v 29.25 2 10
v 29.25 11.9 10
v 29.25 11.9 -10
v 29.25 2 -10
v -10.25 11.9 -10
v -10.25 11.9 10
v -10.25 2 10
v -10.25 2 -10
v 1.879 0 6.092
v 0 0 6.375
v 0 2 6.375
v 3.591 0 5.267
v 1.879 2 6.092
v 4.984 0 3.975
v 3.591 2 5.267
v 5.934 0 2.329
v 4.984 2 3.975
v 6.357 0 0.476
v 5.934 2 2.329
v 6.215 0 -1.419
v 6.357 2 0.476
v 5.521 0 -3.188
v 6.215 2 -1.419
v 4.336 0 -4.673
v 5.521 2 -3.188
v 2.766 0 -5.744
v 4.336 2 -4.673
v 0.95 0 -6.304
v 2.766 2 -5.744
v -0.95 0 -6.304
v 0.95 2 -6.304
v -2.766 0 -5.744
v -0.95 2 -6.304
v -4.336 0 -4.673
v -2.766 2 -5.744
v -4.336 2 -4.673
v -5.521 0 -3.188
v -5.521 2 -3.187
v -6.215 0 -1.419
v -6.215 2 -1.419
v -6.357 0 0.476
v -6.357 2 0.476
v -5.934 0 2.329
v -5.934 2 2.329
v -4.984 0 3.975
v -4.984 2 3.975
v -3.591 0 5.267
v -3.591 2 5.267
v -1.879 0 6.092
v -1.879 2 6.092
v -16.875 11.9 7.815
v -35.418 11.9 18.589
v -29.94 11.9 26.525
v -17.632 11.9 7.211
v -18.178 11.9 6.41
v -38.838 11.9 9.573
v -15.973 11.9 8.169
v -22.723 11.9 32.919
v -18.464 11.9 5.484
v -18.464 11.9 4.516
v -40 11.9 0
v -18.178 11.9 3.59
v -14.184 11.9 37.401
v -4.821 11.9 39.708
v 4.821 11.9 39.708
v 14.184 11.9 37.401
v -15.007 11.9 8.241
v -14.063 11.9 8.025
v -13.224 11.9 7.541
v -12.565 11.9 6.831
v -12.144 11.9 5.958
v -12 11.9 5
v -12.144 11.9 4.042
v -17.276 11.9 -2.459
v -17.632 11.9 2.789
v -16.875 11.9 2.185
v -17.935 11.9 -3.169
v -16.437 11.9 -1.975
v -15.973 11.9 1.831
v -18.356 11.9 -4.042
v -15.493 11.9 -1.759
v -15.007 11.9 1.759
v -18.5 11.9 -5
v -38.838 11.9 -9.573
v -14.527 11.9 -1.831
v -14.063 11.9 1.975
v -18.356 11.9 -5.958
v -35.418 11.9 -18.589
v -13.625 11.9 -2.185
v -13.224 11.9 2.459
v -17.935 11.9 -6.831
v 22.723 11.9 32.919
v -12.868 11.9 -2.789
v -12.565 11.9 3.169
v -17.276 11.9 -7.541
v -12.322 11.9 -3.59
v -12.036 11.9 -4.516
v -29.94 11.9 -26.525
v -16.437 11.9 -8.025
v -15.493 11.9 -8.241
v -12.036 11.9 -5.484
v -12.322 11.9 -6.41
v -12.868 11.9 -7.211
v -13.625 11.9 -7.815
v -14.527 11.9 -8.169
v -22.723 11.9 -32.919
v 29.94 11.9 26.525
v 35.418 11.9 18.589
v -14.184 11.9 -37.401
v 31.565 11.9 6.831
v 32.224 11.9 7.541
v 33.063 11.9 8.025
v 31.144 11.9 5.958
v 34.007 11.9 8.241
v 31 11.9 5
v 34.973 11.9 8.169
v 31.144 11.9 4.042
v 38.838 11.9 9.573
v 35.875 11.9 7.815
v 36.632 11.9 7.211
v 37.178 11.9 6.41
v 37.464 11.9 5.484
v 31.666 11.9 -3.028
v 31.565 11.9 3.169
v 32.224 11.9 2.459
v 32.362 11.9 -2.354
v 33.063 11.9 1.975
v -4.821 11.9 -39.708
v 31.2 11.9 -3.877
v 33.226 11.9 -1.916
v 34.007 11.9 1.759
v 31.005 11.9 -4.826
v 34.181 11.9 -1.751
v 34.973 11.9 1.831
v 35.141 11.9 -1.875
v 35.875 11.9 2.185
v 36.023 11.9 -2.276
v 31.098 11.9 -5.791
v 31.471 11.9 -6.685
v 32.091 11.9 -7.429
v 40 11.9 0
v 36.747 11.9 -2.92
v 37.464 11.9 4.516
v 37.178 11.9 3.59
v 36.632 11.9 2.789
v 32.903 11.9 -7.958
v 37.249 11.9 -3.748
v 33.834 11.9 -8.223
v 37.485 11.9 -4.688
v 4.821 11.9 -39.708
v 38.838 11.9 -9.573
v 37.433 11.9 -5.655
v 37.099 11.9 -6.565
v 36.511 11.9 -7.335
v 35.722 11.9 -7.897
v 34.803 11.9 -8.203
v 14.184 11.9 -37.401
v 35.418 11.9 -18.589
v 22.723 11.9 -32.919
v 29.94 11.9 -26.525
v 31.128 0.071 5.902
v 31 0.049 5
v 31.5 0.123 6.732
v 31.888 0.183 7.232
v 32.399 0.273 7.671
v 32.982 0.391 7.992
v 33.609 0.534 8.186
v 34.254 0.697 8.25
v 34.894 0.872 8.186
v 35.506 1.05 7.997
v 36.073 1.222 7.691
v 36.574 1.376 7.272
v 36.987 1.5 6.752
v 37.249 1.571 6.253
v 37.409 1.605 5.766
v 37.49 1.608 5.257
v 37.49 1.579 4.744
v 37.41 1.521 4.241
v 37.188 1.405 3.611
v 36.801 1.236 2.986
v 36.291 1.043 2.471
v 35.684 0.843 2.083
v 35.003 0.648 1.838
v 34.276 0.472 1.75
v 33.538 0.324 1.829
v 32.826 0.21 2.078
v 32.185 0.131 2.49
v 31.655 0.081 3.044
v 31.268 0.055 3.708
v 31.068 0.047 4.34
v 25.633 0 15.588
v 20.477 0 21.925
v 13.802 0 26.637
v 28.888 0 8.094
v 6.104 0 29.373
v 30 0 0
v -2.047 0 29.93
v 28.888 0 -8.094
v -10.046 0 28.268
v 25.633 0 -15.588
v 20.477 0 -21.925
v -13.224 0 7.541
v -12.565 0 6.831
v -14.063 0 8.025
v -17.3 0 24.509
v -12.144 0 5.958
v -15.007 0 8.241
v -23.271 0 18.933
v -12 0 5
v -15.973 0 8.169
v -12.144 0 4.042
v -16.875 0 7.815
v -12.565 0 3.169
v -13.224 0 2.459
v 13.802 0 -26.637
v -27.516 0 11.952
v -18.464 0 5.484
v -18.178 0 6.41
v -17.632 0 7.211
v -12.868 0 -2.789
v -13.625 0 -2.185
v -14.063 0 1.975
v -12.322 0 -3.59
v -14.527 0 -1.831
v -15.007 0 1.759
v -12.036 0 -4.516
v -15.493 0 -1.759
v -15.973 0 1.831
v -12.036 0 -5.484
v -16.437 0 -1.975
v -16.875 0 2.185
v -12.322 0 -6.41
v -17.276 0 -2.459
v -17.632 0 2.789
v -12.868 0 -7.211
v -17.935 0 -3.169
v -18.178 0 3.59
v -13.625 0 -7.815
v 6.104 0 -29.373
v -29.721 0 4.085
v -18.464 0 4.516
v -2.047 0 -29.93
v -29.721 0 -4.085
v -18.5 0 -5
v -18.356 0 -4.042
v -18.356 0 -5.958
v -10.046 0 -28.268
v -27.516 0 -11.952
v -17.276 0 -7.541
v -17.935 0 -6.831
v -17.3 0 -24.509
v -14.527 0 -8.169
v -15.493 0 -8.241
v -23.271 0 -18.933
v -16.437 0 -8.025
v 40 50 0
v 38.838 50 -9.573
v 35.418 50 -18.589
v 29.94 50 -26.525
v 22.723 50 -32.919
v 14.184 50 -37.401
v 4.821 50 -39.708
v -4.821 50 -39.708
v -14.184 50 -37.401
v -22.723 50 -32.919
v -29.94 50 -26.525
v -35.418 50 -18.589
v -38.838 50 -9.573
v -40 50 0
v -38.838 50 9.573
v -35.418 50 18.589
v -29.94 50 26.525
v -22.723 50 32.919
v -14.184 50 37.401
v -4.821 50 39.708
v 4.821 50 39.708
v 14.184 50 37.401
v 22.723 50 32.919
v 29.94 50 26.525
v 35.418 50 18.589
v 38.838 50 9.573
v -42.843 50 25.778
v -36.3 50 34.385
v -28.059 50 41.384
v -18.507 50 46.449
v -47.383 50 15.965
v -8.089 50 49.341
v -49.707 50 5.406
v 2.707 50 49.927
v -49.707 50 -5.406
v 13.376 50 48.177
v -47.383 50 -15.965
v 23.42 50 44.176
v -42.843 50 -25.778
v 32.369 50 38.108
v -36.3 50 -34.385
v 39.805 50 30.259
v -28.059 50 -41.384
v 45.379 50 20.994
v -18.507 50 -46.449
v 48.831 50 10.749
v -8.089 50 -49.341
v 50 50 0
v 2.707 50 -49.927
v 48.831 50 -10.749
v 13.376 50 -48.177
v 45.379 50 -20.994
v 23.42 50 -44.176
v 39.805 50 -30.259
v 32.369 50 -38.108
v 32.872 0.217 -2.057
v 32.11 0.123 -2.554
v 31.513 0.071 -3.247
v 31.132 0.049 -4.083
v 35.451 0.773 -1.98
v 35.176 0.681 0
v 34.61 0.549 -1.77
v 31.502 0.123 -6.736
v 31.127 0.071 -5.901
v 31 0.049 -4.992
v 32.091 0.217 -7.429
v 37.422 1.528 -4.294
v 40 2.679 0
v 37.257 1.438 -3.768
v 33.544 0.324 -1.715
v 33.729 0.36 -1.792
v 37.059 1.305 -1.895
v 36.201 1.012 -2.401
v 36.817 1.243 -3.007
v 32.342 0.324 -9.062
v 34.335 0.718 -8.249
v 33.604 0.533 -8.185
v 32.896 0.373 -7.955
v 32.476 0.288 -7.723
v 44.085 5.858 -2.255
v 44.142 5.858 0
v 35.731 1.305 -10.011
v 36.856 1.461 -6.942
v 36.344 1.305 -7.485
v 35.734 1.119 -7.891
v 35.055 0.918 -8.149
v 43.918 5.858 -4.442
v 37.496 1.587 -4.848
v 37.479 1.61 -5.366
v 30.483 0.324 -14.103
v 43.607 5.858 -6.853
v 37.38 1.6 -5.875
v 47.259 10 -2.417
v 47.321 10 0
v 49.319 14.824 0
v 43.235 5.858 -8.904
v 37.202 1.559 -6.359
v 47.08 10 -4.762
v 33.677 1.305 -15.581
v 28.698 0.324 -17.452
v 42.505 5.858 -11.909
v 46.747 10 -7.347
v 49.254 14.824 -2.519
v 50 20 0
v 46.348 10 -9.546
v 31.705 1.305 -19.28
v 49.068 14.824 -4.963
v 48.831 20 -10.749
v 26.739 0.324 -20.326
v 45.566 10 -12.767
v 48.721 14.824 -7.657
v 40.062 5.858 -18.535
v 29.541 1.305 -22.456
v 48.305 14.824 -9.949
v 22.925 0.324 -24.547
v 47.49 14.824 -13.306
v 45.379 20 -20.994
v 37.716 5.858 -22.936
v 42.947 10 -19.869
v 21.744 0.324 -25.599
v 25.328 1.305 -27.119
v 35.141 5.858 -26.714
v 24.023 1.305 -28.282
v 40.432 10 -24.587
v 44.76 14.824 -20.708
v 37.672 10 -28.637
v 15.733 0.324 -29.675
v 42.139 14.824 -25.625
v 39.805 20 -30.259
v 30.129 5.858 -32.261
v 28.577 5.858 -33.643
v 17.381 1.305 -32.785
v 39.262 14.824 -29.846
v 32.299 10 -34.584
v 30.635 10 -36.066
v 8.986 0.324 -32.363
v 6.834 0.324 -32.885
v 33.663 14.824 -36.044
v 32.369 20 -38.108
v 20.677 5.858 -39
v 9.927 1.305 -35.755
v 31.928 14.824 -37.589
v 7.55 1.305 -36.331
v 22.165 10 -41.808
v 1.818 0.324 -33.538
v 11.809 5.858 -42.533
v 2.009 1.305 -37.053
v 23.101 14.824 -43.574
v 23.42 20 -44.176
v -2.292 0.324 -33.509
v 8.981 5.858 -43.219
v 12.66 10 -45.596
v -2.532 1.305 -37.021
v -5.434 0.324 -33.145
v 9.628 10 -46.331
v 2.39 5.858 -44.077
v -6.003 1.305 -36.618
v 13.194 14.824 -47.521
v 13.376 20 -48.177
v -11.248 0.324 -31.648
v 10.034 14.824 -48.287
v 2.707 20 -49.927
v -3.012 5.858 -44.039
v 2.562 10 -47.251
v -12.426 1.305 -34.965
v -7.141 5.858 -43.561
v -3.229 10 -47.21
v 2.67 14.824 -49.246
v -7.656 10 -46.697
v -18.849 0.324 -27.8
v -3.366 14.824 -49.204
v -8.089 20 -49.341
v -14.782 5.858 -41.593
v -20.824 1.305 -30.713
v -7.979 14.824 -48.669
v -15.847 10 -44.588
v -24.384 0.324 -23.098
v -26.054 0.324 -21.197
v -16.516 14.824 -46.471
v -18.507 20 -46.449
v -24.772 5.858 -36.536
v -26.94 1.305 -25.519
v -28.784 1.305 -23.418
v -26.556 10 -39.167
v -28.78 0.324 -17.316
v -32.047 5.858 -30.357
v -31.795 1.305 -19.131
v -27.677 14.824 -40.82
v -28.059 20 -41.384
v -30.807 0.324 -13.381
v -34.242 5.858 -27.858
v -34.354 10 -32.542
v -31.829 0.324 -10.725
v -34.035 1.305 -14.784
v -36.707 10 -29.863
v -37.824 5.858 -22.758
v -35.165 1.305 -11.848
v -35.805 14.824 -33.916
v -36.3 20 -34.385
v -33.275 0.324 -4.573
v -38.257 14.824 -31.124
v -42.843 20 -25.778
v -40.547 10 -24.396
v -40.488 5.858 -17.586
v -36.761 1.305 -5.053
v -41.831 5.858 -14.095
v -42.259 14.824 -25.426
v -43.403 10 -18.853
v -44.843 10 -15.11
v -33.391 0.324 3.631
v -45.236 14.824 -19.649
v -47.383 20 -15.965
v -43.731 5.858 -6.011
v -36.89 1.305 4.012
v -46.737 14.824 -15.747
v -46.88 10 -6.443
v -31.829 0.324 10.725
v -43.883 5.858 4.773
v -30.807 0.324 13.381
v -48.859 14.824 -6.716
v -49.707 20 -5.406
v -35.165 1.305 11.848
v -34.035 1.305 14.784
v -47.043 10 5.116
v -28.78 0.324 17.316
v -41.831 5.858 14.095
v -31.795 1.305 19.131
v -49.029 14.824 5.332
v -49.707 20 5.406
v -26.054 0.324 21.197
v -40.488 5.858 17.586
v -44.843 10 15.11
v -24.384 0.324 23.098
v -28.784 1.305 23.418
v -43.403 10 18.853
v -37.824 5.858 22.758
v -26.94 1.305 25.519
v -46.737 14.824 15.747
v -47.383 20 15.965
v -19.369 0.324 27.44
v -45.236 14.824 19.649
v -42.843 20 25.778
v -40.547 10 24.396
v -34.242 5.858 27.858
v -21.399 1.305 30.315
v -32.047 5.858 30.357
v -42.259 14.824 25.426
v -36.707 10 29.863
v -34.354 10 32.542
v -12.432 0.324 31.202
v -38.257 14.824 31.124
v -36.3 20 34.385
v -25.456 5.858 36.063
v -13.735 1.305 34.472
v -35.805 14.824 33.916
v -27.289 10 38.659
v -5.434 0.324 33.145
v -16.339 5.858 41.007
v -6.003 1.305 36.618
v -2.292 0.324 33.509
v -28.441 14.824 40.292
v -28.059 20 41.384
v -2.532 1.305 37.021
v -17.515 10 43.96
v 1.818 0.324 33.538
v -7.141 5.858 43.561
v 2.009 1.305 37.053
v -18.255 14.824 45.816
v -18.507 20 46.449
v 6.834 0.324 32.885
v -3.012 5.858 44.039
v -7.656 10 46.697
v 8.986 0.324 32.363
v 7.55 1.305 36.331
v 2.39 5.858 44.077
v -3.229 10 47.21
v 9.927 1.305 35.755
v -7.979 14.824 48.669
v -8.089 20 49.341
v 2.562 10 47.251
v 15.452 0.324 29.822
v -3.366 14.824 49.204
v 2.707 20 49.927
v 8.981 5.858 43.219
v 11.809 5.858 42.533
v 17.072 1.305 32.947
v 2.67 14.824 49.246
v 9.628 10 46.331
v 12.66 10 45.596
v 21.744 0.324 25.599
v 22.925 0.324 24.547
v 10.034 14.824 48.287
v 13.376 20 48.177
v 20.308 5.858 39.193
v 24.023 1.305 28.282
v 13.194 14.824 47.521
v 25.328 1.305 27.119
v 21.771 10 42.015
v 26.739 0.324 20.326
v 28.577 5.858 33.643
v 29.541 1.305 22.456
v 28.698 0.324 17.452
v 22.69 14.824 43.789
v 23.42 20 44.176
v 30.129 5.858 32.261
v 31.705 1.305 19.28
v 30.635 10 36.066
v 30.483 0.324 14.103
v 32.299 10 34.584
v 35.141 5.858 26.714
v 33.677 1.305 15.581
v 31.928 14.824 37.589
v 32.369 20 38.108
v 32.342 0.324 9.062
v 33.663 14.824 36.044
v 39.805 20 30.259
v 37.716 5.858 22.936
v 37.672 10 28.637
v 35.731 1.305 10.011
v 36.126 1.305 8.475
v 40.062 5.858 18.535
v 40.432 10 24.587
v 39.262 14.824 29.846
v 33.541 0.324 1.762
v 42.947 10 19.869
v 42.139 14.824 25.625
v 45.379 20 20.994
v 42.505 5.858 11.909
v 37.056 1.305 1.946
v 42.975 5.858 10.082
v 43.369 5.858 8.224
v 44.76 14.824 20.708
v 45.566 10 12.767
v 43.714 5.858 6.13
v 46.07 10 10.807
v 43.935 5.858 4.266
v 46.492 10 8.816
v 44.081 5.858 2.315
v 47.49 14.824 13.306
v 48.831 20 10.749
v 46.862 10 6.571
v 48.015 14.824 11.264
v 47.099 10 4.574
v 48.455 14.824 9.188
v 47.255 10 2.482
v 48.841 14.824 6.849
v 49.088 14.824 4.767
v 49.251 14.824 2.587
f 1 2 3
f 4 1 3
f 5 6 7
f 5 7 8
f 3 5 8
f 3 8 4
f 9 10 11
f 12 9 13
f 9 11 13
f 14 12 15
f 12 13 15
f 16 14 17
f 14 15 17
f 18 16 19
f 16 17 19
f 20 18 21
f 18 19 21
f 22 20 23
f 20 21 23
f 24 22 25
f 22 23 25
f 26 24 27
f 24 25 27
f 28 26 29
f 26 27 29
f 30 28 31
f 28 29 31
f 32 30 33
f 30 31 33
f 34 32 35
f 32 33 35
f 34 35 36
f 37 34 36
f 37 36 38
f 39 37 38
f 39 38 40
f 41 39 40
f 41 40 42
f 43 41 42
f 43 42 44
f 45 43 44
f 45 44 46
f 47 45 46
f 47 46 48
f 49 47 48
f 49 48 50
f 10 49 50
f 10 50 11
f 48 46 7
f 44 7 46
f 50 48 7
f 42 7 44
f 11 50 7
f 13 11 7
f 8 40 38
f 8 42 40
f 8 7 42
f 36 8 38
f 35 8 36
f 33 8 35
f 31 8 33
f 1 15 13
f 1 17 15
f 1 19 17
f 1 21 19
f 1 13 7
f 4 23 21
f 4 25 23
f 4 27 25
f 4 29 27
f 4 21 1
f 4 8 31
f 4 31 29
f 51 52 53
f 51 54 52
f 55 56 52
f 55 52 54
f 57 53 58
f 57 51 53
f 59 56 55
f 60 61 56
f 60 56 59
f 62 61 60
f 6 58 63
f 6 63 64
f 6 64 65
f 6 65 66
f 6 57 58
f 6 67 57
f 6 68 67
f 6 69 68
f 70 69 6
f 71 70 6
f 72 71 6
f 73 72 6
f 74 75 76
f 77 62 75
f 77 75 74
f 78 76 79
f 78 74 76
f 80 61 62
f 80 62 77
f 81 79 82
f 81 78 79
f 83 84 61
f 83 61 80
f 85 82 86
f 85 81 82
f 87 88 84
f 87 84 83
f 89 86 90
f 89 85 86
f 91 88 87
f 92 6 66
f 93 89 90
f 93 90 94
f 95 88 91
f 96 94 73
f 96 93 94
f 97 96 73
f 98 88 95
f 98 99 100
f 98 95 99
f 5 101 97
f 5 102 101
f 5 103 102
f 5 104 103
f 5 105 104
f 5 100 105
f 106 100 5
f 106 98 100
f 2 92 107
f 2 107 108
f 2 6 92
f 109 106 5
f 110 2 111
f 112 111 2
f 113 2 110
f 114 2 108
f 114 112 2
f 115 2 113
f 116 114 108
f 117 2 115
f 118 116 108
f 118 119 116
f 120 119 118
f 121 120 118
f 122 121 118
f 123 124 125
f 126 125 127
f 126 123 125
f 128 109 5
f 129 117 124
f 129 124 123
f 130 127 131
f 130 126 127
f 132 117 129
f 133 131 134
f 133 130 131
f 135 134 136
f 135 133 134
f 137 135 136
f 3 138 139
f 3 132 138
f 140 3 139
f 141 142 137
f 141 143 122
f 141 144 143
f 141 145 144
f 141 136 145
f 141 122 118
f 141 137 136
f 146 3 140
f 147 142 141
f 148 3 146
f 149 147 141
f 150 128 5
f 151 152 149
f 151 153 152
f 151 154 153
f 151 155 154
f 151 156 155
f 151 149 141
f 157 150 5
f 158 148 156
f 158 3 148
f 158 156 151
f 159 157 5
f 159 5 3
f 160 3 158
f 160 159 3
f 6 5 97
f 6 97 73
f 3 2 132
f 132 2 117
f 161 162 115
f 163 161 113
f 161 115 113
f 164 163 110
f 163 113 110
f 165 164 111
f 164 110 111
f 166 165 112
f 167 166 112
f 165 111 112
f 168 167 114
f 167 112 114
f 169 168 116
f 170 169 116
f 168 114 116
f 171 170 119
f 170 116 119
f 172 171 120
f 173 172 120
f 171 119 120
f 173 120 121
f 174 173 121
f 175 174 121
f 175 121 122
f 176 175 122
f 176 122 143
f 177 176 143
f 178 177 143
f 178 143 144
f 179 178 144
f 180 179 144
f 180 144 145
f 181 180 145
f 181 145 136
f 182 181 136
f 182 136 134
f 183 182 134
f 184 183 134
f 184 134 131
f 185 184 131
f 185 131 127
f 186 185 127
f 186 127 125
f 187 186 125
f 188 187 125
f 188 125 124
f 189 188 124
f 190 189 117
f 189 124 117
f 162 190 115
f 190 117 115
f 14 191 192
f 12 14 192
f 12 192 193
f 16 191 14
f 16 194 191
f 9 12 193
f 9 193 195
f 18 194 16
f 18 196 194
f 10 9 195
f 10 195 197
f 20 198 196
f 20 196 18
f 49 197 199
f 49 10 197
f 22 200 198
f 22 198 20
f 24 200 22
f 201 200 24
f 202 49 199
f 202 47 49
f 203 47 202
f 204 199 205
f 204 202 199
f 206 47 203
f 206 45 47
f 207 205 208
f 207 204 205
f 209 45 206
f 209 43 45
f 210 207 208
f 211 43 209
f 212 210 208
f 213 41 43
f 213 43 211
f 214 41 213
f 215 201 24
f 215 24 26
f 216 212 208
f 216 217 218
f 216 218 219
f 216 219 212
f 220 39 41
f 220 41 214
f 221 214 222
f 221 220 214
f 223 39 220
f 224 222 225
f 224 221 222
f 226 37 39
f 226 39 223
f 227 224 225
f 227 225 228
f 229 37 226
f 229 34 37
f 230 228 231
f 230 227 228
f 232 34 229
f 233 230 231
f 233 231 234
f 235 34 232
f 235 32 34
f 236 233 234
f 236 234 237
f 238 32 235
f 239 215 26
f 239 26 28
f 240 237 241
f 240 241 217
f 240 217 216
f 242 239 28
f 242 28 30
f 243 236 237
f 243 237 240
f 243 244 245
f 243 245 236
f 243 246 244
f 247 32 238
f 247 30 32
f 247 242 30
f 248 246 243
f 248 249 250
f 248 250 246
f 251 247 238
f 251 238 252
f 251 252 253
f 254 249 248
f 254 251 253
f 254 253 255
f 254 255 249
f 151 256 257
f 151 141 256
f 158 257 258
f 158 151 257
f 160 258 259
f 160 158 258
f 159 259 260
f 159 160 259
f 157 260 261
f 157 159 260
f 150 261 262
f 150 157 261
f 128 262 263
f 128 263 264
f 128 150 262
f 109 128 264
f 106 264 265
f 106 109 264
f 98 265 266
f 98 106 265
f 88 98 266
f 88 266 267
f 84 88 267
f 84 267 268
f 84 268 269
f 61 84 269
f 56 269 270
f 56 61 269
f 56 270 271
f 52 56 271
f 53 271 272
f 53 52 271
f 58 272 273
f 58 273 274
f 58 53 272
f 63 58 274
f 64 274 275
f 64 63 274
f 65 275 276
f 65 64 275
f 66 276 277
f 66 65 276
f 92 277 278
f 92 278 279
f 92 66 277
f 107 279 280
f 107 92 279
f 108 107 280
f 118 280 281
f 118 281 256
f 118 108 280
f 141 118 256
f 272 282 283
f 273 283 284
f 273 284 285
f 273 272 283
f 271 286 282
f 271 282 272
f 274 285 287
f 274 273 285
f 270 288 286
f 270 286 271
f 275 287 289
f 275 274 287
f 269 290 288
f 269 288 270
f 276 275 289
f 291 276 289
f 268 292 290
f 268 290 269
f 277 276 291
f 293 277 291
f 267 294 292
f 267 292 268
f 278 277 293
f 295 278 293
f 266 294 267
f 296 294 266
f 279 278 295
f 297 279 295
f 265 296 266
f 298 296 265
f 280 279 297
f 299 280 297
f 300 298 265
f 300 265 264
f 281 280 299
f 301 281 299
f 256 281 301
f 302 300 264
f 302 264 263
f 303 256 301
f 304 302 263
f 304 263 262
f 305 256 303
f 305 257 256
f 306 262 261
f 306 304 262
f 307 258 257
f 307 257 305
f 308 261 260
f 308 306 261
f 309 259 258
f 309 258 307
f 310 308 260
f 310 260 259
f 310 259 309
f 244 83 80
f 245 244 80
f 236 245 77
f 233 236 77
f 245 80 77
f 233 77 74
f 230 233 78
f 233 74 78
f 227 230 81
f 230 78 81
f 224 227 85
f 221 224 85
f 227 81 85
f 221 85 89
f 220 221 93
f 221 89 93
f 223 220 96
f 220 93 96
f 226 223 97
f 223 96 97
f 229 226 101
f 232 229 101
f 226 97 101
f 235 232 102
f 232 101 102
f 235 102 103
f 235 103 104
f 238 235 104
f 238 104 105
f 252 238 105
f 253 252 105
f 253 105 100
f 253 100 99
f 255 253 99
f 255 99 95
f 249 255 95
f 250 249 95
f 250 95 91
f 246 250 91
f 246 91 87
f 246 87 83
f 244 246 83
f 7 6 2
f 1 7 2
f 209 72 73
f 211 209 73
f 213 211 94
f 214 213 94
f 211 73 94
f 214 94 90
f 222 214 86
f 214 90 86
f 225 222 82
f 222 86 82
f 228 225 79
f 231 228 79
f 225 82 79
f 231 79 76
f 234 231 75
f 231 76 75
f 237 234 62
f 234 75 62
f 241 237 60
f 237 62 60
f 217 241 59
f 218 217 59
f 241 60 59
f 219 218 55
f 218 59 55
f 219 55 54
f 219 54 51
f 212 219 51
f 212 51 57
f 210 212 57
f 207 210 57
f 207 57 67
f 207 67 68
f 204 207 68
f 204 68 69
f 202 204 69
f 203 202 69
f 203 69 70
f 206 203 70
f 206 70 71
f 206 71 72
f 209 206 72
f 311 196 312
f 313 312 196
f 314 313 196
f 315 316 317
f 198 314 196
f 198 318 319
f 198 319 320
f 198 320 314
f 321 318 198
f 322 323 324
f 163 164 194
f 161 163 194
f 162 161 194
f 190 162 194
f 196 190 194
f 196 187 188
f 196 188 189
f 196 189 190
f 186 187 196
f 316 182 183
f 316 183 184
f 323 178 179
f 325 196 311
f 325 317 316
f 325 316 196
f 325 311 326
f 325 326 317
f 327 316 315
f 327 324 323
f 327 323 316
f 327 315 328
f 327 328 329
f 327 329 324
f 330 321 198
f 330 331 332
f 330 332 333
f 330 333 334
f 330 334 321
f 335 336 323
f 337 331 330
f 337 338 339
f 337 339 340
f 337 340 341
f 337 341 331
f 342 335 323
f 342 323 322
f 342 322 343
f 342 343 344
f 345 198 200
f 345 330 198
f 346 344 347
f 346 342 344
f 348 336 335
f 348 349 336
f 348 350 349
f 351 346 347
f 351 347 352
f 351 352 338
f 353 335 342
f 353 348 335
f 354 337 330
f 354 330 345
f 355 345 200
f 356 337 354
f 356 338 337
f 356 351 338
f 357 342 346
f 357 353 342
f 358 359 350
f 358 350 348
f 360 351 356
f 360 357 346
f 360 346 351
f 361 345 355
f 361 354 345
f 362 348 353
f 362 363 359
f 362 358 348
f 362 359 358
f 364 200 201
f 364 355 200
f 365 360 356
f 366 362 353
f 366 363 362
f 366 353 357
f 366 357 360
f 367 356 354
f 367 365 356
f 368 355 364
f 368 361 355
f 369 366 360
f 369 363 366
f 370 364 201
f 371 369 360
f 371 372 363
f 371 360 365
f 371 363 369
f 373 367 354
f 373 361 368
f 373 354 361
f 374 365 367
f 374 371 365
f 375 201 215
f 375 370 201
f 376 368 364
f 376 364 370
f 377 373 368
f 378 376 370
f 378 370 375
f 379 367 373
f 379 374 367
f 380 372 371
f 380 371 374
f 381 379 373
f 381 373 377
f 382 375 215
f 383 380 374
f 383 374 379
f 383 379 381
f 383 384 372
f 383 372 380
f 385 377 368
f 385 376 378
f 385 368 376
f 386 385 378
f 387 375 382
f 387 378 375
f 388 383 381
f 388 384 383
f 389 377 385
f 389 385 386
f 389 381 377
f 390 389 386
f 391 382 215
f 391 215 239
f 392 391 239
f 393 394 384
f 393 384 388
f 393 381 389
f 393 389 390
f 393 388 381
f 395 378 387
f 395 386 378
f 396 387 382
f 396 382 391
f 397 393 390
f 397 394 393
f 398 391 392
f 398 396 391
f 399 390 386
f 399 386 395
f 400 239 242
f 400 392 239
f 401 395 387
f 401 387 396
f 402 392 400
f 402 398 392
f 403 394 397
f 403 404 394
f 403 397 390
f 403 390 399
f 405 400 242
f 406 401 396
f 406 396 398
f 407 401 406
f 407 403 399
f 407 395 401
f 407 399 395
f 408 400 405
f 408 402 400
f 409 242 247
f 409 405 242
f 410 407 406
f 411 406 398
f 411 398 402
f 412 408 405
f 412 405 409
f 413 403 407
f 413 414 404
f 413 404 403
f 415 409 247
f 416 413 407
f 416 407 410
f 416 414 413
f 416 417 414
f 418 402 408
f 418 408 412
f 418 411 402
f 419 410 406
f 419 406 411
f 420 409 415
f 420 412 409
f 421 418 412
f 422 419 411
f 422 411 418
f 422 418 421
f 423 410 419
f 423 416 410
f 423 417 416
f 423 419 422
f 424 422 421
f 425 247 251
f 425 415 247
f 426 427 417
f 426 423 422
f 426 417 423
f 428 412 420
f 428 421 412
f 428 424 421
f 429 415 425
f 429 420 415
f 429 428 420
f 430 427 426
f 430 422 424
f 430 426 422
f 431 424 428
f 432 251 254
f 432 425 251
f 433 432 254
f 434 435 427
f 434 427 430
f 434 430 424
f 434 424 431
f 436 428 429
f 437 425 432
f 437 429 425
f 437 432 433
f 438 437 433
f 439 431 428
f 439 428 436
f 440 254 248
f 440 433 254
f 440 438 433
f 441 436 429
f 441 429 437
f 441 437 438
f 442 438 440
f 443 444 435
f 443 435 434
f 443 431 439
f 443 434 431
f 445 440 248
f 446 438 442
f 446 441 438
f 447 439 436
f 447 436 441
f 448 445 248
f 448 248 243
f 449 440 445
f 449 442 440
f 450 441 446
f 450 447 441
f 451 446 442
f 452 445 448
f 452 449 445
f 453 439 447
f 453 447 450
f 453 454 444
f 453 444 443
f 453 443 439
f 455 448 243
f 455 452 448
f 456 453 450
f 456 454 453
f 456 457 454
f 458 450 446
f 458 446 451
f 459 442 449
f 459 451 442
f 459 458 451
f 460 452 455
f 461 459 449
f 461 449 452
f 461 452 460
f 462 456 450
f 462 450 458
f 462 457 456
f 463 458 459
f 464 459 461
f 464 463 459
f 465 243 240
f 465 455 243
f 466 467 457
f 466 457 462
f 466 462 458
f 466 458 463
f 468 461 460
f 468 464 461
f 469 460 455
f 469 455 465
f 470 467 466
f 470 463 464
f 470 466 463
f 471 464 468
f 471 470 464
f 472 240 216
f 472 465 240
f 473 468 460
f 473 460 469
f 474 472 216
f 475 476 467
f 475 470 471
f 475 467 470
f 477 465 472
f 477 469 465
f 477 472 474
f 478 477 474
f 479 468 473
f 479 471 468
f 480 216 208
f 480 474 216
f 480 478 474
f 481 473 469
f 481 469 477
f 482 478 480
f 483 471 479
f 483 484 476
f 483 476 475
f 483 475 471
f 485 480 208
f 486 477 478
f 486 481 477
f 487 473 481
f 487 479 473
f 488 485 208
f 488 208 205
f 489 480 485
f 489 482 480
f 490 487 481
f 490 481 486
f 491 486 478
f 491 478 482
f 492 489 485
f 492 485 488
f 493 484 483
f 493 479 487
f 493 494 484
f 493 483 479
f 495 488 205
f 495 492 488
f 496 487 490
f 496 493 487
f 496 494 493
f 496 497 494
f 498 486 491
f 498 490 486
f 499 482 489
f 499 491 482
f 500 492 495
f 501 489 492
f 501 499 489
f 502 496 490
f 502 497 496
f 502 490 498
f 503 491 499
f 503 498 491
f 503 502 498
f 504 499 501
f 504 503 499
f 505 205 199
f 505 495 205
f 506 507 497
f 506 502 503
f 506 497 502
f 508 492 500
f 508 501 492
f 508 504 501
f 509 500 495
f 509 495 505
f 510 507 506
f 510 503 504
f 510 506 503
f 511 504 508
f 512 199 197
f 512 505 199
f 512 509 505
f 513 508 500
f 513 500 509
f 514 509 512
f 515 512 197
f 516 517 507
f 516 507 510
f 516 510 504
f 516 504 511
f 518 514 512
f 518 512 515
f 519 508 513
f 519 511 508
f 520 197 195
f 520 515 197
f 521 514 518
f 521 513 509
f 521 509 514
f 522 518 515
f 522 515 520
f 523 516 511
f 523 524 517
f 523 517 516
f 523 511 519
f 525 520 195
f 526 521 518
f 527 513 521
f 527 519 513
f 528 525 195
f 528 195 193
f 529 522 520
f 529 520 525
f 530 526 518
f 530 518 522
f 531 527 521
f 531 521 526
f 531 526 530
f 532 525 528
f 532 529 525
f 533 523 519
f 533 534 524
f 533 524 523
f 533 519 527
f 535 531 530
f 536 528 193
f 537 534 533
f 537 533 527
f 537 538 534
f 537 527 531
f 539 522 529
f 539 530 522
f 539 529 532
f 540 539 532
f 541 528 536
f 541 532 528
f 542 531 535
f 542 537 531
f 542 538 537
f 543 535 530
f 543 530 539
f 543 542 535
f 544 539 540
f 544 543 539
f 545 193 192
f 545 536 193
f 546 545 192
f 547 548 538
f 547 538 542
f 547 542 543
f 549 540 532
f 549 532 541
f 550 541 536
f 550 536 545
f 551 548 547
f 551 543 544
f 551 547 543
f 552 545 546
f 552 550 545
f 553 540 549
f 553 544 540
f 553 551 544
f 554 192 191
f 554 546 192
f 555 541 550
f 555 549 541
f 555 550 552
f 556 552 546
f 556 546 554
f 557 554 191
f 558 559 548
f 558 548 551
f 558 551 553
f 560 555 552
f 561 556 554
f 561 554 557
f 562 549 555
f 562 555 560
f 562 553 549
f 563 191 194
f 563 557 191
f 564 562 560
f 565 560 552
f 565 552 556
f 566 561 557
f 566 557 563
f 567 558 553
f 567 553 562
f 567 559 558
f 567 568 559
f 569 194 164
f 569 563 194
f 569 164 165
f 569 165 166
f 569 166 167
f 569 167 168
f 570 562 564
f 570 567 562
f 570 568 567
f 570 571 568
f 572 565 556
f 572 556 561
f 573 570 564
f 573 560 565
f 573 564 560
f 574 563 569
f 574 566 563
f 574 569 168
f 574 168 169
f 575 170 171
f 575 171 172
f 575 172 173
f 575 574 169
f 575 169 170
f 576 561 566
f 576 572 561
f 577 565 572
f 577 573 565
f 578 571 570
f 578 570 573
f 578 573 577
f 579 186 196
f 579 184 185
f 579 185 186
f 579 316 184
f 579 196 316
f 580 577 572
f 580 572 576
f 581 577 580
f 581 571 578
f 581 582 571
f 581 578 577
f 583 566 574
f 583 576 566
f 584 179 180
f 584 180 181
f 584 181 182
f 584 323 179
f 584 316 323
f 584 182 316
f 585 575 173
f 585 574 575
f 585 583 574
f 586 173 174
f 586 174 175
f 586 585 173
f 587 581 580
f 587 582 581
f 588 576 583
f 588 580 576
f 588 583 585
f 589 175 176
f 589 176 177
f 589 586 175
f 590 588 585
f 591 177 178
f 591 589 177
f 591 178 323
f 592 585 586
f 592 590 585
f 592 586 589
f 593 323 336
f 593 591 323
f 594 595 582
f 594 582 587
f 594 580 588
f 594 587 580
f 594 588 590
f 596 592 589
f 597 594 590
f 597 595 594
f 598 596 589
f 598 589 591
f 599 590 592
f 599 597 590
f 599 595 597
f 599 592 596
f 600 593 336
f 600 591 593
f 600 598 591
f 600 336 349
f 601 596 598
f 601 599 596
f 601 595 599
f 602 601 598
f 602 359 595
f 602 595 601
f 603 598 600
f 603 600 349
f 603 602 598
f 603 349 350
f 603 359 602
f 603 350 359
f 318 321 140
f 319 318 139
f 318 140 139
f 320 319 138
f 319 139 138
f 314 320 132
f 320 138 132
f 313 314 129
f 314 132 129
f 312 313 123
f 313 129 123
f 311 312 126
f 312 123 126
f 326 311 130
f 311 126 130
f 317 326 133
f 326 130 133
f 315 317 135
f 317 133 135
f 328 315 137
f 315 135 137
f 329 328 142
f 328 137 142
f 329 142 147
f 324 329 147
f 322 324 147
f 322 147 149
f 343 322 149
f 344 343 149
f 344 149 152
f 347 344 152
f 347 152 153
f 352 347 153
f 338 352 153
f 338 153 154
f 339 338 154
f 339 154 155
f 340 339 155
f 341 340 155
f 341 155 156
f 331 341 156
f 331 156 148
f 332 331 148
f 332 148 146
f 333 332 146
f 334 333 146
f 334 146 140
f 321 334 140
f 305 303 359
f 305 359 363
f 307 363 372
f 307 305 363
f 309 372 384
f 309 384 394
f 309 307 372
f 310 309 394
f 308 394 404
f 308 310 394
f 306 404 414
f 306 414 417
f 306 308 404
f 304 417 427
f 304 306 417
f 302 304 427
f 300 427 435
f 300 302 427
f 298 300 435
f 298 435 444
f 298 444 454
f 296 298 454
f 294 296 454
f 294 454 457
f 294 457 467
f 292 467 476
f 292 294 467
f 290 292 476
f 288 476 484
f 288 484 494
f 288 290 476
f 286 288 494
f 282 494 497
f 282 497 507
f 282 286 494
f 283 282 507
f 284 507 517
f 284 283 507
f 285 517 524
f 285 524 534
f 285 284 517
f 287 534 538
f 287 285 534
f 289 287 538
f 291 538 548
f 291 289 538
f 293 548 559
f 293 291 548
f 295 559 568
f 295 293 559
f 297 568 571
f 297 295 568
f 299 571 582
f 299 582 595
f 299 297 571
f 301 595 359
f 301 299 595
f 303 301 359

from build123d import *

# Parameters (mm, degrees)
FILLET1_R          = 20
SKETCH6_W          = 39.5
SKETCH6_H          = 20
SKETCH6_R          = 6.375
CUT_EXTRUDE1_DEPTH = 9.9
SKETCH8_R          = 6.375
CUT_EXTRUDE2_DEPTH = 37.9
SKETCH9_R          = 3.25
CUT_EXTRUDE3_DEPTH = 37.9


with BuildPart() as part:
    # Sketch5 → Revolve1 (revolve)
    with BuildSketch(Plane.XY, mode=Mode.PRIVATE) as revolve1_sk:
        Polygon((0, 0), (-50, 0), (-50, 50), (-40, 50), (-40, 11.9), (0, 11.9), align=None)
    revolve(revolve1_sk.sketch.rotate(Axis((0, 0, 0), (0, 1, 0)), 180), axis=Axis((0, 0, 0), (0, 1, 0)))

    # Fillet1
    fillet1_edges = [part.edges().sort_by_distance(p)[0] for p in [
        (-50, 0, 0),
    ]]
    fillet(fillet1_edges, radius=FILLET1_R)

    # Sketch6 → Cut-Extrude1 (cut)
    with BuildSketch(Plane(origin=(0, 11.9, 0), x_dir=(1, 0, 0), z_dir=(0, 1, 0))):
        with Locations((9.5, 0)):
            Rectangle(SKETCH6_W, SKETCH6_H)
        with Locations(Location((0, 0, 0), (0, 0, 180))):
            Circle(SKETCH6_R, mode=Mode.SUBTRACT)
    extrude(amount=-CUT_EXTRUDE1_DEPTH, mode=Mode.SUBTRACT)

    # Sketch8 → Cut-Extrude2 (cut)
    with BuildSketch(Plane(origin=(0, 11.9, 0), x_dir=(1, 0, 0), z_dir=(0, 1, 0))):
        with Locations(Location((0, 0, 0), (0, 0, 270))):
            Circle(SKETCH8_R)
    extrude(amount=-CUT_EXTRUDE2_DEPTH, mode=Mode.SUBTRACT)

    # Sketch9 → Cut-Extrude3 (cut)
    with BuildSketch(Plane(origin=(0, 11.9, 0), x_dir=(1, 0, 0), z_dir=(0, 1, 0))):
        with Locations(Location((-15.25, 5, 0), (0, 0, 180))):
            Circle(SKETCH9_R)
        with Locations(Location((34.25, 5, 0), (0, 0, 131.634247299))):
            Circle(SKETCH9_R)
        with Locations(Location((34.25, -5, 0), (0, 0, 180))):
            Circle(SKETCH9_R)
        with Locations((-15.25, -5)):
            Circle(SKETCH9_R)
    extrude(amount=-CUT_EXTRUDE3_DEPTH, mode=Mode.SUBTRACT)


solid = part.part
